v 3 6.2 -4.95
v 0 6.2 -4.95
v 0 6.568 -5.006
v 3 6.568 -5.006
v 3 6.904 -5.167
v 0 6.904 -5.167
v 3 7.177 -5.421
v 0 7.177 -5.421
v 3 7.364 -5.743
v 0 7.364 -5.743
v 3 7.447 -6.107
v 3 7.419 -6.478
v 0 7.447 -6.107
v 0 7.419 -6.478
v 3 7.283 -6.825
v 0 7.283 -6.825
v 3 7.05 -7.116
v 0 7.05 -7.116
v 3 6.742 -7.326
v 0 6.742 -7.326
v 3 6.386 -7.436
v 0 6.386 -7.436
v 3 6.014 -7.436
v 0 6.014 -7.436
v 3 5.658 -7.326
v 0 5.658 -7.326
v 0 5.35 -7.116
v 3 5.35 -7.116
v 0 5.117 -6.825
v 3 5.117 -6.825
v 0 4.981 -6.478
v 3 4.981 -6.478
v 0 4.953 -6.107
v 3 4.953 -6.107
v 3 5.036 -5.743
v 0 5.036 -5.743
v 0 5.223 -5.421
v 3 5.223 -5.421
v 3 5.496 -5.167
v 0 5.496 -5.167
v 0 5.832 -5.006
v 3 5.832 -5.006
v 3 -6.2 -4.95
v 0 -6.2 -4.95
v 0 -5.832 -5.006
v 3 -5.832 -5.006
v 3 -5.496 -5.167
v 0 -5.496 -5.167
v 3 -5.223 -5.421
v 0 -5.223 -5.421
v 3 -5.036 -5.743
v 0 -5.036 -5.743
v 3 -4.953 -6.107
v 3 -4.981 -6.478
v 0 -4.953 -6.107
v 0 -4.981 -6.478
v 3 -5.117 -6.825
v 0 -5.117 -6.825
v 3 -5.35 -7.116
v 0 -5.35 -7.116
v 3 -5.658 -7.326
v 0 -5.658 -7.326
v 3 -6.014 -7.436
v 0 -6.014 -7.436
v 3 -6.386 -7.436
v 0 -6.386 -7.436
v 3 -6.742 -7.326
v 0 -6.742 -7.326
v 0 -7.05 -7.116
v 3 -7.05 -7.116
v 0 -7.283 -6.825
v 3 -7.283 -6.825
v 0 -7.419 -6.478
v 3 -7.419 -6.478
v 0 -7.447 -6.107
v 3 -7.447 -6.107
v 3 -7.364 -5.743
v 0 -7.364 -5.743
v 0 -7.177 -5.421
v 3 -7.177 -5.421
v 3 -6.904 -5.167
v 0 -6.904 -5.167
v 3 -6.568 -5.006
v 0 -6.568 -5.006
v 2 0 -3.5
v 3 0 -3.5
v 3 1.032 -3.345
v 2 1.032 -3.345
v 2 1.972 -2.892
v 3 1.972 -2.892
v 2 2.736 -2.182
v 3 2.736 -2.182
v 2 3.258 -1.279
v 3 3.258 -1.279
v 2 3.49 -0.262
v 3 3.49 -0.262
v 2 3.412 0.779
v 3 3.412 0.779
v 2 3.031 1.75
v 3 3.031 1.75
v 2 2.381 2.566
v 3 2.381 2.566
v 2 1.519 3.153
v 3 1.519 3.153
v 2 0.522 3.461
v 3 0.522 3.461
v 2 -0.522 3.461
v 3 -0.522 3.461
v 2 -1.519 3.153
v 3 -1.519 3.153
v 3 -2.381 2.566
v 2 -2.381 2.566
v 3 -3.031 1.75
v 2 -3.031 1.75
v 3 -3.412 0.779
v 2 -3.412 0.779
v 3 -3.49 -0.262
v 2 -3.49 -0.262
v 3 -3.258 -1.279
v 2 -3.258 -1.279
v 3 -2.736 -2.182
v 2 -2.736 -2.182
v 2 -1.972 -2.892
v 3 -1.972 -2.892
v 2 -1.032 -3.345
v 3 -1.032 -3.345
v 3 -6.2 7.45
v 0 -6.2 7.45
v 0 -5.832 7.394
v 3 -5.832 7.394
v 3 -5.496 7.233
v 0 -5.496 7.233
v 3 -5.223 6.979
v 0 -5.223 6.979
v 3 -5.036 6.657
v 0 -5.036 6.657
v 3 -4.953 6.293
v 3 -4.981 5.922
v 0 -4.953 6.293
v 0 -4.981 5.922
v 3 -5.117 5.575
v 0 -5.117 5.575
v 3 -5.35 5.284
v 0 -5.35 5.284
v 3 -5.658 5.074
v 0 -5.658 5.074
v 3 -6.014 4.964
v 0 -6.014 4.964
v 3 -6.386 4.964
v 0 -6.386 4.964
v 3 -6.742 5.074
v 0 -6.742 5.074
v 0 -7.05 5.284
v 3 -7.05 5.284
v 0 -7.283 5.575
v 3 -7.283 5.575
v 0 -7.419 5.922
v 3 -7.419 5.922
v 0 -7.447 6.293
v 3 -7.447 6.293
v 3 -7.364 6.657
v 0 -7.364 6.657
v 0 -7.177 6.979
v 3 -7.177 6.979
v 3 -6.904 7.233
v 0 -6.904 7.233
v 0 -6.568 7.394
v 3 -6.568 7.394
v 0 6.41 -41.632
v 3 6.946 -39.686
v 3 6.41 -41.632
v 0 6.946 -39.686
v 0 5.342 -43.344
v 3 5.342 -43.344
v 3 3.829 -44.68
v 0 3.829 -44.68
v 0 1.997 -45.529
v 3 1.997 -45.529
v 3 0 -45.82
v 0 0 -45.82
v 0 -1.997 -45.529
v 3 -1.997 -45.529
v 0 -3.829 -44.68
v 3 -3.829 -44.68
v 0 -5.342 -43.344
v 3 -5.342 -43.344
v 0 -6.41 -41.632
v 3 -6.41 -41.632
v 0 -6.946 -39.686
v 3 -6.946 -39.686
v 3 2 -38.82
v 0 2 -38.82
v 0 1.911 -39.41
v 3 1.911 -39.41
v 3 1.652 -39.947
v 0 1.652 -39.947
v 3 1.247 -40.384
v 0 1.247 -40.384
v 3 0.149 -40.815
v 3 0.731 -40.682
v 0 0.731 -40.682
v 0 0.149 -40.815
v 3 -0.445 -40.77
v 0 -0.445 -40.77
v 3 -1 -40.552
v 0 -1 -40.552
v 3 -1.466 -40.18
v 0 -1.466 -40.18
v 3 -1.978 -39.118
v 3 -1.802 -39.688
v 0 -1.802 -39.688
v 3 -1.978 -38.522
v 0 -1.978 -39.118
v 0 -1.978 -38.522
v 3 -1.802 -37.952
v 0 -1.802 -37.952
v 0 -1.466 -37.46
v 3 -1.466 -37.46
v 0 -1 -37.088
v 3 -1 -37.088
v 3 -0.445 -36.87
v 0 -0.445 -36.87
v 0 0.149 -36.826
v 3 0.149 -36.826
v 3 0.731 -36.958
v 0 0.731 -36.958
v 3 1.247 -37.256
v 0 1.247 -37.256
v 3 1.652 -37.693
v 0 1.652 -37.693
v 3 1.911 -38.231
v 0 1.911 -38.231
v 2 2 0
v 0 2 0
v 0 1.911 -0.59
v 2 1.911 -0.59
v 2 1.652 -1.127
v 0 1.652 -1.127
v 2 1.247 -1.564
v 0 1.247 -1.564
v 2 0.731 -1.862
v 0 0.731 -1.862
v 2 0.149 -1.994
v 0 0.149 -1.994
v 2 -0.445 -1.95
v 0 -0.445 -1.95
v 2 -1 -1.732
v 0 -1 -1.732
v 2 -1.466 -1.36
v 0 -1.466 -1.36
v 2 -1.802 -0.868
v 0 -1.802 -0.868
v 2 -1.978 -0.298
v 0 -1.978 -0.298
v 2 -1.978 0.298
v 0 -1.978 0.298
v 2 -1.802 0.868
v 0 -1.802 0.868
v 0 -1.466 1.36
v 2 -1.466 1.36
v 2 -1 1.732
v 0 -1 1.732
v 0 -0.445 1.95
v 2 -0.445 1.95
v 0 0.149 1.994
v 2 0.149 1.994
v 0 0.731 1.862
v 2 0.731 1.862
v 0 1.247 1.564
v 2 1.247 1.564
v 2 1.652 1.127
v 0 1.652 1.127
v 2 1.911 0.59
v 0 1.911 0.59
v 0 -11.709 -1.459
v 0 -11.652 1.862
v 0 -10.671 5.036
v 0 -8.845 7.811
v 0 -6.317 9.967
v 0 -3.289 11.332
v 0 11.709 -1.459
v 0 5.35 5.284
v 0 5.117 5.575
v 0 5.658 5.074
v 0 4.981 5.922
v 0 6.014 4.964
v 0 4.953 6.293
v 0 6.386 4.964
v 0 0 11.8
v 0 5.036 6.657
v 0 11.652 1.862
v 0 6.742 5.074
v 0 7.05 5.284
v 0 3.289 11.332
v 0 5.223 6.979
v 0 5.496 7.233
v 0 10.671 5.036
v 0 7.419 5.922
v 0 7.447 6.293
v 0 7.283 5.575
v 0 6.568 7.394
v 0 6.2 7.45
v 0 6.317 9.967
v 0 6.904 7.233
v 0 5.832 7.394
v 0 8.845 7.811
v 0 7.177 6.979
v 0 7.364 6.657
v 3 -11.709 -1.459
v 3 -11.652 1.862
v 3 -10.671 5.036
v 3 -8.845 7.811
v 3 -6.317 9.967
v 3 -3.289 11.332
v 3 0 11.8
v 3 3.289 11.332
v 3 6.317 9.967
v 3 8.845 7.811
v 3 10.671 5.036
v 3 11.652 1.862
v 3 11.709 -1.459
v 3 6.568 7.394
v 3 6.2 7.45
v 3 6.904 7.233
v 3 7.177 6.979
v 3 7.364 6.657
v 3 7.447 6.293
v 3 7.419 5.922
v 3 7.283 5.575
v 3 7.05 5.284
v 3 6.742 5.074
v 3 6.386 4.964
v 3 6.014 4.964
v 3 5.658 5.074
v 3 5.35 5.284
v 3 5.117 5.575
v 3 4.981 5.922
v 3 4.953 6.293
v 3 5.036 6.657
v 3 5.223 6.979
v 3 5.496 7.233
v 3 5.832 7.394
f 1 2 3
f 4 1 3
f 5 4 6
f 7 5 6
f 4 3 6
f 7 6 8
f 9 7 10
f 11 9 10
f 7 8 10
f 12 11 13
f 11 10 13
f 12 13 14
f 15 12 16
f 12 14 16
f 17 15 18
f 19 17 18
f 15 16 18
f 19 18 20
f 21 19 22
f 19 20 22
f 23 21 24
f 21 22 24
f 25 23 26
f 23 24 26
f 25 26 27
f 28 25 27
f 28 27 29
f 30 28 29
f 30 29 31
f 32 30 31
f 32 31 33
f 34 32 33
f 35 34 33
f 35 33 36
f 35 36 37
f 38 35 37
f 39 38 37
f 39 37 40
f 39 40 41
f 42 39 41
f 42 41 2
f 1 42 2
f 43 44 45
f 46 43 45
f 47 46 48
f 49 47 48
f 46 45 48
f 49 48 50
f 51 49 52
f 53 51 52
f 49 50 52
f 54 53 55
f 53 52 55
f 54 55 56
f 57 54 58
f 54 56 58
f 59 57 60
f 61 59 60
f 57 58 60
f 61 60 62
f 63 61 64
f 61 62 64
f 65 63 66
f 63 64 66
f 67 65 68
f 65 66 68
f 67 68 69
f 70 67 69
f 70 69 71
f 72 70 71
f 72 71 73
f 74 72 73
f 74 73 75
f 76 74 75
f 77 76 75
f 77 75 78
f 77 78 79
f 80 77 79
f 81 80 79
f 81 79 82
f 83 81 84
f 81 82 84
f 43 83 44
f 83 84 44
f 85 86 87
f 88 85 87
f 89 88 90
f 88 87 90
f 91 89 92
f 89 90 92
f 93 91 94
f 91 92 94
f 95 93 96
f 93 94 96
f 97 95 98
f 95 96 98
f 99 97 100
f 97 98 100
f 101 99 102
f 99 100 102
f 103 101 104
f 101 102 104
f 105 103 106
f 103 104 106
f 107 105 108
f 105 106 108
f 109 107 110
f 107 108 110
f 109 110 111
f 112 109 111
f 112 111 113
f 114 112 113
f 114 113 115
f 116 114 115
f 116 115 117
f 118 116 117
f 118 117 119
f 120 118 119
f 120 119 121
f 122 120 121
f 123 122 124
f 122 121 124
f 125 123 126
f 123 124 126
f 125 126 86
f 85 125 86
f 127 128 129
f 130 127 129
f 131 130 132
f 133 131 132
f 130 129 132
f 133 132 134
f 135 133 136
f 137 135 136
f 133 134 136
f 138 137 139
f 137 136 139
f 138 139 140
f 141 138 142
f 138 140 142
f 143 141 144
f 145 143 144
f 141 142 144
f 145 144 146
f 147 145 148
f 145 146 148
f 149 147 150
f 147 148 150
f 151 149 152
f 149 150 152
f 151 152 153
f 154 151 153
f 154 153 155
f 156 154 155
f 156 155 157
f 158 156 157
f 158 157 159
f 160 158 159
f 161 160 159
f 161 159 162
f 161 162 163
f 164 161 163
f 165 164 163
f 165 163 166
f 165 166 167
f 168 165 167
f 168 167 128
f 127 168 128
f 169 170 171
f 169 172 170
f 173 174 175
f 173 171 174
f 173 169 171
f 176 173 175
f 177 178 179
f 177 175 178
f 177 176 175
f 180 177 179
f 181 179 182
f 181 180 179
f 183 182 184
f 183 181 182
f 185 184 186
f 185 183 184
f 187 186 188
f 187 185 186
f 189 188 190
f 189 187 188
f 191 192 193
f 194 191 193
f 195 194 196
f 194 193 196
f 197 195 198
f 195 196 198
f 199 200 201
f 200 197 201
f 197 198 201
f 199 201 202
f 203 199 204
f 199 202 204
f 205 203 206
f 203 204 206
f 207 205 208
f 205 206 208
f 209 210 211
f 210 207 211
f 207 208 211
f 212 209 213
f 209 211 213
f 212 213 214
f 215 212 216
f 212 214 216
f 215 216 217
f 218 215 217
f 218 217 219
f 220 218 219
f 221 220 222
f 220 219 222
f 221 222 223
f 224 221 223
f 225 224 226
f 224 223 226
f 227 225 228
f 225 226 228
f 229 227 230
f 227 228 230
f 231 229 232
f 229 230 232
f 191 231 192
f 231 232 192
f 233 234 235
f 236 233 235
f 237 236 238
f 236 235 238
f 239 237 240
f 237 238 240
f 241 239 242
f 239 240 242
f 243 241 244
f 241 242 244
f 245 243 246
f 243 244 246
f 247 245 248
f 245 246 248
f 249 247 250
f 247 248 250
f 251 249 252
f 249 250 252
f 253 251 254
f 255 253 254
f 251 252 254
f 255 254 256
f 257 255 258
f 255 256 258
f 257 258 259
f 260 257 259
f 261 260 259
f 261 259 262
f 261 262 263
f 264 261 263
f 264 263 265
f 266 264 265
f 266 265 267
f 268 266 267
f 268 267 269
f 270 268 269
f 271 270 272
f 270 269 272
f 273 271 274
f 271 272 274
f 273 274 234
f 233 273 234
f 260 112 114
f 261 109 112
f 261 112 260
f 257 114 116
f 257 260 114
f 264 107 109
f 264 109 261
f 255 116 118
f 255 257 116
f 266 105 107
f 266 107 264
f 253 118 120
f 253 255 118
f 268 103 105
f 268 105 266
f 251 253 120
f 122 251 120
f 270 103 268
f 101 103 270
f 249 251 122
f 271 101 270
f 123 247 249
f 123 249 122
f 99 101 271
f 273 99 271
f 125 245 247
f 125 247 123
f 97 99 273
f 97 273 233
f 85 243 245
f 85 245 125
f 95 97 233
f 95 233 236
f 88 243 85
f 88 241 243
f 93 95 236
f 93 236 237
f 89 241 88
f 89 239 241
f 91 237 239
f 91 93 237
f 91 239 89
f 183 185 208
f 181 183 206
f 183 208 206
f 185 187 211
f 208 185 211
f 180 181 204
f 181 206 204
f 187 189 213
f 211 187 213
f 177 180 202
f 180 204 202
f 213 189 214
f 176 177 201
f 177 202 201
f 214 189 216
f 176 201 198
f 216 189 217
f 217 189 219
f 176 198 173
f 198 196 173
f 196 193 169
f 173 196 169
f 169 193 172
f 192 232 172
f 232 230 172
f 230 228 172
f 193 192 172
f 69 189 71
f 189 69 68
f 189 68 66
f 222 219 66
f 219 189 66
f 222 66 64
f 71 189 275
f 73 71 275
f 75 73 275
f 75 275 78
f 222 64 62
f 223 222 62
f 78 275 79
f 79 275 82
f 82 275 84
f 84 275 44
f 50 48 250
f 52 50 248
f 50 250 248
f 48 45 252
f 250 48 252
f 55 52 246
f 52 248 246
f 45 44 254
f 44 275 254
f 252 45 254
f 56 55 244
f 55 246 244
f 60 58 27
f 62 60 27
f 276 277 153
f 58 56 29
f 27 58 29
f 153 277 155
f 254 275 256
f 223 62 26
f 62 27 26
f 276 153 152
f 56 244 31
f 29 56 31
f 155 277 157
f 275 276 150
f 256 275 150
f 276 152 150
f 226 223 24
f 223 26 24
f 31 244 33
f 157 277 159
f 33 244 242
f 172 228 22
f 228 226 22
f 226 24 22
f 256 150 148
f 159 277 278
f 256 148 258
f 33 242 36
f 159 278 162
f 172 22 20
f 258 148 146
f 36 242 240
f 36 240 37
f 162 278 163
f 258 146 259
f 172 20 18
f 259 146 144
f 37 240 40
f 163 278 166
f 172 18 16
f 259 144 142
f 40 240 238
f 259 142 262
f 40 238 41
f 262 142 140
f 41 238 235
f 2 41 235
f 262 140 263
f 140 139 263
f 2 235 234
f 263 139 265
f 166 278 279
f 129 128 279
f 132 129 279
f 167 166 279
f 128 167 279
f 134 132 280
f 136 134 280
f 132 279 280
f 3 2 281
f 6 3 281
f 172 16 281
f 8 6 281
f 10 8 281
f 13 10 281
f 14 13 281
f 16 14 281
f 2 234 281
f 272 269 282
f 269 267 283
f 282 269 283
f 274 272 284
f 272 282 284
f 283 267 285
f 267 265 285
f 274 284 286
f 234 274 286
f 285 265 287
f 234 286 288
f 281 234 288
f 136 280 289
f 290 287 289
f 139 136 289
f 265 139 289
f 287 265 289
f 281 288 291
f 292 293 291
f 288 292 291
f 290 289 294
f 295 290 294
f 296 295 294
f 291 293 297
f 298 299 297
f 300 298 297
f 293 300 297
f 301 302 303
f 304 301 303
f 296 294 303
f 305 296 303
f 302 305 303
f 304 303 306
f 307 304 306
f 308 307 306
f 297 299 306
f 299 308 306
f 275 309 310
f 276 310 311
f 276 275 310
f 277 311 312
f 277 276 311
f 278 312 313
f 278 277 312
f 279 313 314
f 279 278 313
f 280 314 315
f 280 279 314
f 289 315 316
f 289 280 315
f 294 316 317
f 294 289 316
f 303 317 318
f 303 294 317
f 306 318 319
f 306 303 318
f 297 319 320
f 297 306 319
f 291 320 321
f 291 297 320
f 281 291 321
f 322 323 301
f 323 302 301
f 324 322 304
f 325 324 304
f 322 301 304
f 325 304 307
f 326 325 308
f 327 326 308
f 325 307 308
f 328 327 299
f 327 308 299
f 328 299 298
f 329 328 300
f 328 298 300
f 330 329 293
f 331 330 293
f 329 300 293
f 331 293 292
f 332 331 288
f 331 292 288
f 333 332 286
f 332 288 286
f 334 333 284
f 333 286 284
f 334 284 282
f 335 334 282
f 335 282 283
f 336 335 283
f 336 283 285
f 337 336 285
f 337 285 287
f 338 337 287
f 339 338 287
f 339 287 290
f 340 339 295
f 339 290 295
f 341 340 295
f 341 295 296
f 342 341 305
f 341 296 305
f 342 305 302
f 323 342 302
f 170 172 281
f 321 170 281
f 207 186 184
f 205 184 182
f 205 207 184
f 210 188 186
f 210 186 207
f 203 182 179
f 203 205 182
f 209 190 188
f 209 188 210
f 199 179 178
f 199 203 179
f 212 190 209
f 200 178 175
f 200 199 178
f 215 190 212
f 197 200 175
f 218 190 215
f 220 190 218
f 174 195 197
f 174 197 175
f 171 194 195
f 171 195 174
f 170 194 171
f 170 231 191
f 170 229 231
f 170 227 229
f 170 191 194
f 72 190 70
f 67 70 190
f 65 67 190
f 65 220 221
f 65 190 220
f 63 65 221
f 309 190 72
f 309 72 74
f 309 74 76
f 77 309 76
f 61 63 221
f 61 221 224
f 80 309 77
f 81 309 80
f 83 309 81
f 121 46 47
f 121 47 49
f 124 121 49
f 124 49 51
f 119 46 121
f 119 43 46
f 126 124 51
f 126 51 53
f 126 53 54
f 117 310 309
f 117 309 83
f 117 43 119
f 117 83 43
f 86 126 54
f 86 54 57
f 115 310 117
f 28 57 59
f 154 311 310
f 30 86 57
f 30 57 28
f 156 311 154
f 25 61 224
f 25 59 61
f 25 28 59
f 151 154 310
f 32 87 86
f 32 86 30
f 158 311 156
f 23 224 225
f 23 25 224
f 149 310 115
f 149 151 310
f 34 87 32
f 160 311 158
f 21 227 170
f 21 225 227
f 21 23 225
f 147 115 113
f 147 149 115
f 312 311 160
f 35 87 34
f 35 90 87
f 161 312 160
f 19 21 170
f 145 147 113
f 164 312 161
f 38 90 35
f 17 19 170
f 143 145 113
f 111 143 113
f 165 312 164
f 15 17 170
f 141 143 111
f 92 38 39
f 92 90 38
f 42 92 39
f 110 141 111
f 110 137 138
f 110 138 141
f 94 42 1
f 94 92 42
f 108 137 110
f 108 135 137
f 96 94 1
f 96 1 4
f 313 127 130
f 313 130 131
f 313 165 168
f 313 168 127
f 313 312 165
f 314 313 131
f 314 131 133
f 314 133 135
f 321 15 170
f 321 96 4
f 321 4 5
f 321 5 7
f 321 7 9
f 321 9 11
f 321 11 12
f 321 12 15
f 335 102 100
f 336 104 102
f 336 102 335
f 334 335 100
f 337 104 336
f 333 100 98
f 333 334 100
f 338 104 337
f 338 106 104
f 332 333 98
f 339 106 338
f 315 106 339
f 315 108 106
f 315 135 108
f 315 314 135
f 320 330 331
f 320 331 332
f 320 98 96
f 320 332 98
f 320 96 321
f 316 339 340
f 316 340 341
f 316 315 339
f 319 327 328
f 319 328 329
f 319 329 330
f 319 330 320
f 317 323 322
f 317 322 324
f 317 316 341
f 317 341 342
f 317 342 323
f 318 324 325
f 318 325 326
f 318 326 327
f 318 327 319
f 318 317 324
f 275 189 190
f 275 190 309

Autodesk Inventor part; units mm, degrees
ref_plane "YZ Plane" through (0, 0, 0) normal (1, 0, 0) x (0, 1, 0)
ref_plane "XZ Plane" through (0, 0, 0) normal (0, 1, 0) x (-1, 0, 0)
ref_plane "XY Plane" through (0, 0, 0) normal (0, 0, 1) x (1, 0, 0)
sketch "Эскиз1" plane through (0, 0, 0) normal (1, 0, 0) x (0, 1, 0)
  circle A0 centre (35.2311, -22.6062) radius 9.3
  circle A1 centre (0, -38.8201) radius 6.1
  circle A2 centre (0, 0) radius 4.85
  circle A3 centre (35.8147, -49.5529) radius 3.55
  line L0 (6.0968, -38.6237) -> (4.8475, 0.1562)
  line L1 (-4.8475, 0.1562) -> (-6.0968, -38.6237)
  line L2 (0, 0) -> (0, -38.8201) construction
  circle A4 centre (0, -38.8201) radius 2
  circle A5 centre (0, 0) radius 2
  circle A6 centre (0, -38.8201) radius 15 construction
  circle A7 centre (0, 0) radius 14 construction
  circle A8 centre (0, -38.8201) radius 7
  circle A9 centre (0, 0) radius 7
  line L3 (6.9463, -39.6857) -> (11.7094, -1.459)
  line L4 (-6.9463, -39.6857) -> (-11.7094, -1.459)
  circle A10 centre (0, 0) radius 8.8
  circle A11 centre (0, 0) radius 11.8
  point P0 (-7, 0)
  point P1 (-6.9463, -39.6857)
  point P2 (-11.7094, -1.459)
  dimension "d27" = 14
  dimension "d0" = 18.6
  dimension "d1" = 12.2
  dimension "d2" = 9.7
  dimension "d3" = 7.1
  dimension "d8" = 38.8201
  dimension "d13" = 38.8
  dimension "d14" = 38.8
  dimension "d23" = 4
  dimension "d24" = 4
  dimension "d25" = 30
  dimension "d26" = 28
  dimension "d28" = 14
  dimension "d31" = 17.6
  dimension "d32" = 3
extrude "Выдавливание4" add sketch "Эскиз1" along normal blind 3 contours A1 | A1 L0 A8 L1 | A1 L1 A8 L0 | A8 L1 A11 L0 | L0 A11 L3 A8 | A8 L4 A11 L1 | A11 L1 A10 L0 | L0 A10 L1 A11 | A10 L1 A9 L0 | L0 A9 L1 A10 | A9 L1 A2 L0 | L0 A2 L1 A9 | A2
sketch "Эскиз4" plane through (0, 0, 0) normal (-1, 0, 0) x (0, 0, 1)
  circle A0 centre (-6.2, 6.2) radius 1.25
  circle A1 centre (0, 0) radius 2 construction
  circle A2 centre (-38.8201, 0) radius 2 construction
  arc A3 (-1.459, -11.7094) -> (-1.459, 11.7094) centre (0, 0) ccw construction
  line L0 (-39.6857, 6.9463) -> (-1.459, 11.7094) construction
  arc A4 (-39.6857, 6.9463) -> (-39.6857, -6.9463) centre (-38.8201, 0) ccw construction
  line L1 (-1.459, -11.7094) -> (-39.6857, -6.9463) construction
  line L2 (0, 0) -> (0, 11.8) construction
  arc A5 (-1.459, -11.7094) -> (-1.459, 11.7094) centre (0, 0) ccw construction
  line L3 (0, 0) -> (11.8, 0) construction
  circle A6 centre (6.2, 6.2) radius 1.25
  circle A7 centre (-6.2, -6.2) radius 1.25
  circle A8 centre (6.2, -6.2) radius 1.25
  dimension "d33" = 2.5
  dimension "d34" = 12.4
  dimension "d35" = 12.4
extrude "Выдавливание5" cut sketch "Эскиз4" against normal blind 3
sketch "Эскиз5" plane through (3, 0, 0) normal (1, 0, 0) x (0, 0, -1)
  circle A0 centre (0, 0) radius 3.5
  dimension "d38" = 7
extrude "Выдавливание6" cut sketch "Эскиз5" against normal blind 1
properties part number "wall"
